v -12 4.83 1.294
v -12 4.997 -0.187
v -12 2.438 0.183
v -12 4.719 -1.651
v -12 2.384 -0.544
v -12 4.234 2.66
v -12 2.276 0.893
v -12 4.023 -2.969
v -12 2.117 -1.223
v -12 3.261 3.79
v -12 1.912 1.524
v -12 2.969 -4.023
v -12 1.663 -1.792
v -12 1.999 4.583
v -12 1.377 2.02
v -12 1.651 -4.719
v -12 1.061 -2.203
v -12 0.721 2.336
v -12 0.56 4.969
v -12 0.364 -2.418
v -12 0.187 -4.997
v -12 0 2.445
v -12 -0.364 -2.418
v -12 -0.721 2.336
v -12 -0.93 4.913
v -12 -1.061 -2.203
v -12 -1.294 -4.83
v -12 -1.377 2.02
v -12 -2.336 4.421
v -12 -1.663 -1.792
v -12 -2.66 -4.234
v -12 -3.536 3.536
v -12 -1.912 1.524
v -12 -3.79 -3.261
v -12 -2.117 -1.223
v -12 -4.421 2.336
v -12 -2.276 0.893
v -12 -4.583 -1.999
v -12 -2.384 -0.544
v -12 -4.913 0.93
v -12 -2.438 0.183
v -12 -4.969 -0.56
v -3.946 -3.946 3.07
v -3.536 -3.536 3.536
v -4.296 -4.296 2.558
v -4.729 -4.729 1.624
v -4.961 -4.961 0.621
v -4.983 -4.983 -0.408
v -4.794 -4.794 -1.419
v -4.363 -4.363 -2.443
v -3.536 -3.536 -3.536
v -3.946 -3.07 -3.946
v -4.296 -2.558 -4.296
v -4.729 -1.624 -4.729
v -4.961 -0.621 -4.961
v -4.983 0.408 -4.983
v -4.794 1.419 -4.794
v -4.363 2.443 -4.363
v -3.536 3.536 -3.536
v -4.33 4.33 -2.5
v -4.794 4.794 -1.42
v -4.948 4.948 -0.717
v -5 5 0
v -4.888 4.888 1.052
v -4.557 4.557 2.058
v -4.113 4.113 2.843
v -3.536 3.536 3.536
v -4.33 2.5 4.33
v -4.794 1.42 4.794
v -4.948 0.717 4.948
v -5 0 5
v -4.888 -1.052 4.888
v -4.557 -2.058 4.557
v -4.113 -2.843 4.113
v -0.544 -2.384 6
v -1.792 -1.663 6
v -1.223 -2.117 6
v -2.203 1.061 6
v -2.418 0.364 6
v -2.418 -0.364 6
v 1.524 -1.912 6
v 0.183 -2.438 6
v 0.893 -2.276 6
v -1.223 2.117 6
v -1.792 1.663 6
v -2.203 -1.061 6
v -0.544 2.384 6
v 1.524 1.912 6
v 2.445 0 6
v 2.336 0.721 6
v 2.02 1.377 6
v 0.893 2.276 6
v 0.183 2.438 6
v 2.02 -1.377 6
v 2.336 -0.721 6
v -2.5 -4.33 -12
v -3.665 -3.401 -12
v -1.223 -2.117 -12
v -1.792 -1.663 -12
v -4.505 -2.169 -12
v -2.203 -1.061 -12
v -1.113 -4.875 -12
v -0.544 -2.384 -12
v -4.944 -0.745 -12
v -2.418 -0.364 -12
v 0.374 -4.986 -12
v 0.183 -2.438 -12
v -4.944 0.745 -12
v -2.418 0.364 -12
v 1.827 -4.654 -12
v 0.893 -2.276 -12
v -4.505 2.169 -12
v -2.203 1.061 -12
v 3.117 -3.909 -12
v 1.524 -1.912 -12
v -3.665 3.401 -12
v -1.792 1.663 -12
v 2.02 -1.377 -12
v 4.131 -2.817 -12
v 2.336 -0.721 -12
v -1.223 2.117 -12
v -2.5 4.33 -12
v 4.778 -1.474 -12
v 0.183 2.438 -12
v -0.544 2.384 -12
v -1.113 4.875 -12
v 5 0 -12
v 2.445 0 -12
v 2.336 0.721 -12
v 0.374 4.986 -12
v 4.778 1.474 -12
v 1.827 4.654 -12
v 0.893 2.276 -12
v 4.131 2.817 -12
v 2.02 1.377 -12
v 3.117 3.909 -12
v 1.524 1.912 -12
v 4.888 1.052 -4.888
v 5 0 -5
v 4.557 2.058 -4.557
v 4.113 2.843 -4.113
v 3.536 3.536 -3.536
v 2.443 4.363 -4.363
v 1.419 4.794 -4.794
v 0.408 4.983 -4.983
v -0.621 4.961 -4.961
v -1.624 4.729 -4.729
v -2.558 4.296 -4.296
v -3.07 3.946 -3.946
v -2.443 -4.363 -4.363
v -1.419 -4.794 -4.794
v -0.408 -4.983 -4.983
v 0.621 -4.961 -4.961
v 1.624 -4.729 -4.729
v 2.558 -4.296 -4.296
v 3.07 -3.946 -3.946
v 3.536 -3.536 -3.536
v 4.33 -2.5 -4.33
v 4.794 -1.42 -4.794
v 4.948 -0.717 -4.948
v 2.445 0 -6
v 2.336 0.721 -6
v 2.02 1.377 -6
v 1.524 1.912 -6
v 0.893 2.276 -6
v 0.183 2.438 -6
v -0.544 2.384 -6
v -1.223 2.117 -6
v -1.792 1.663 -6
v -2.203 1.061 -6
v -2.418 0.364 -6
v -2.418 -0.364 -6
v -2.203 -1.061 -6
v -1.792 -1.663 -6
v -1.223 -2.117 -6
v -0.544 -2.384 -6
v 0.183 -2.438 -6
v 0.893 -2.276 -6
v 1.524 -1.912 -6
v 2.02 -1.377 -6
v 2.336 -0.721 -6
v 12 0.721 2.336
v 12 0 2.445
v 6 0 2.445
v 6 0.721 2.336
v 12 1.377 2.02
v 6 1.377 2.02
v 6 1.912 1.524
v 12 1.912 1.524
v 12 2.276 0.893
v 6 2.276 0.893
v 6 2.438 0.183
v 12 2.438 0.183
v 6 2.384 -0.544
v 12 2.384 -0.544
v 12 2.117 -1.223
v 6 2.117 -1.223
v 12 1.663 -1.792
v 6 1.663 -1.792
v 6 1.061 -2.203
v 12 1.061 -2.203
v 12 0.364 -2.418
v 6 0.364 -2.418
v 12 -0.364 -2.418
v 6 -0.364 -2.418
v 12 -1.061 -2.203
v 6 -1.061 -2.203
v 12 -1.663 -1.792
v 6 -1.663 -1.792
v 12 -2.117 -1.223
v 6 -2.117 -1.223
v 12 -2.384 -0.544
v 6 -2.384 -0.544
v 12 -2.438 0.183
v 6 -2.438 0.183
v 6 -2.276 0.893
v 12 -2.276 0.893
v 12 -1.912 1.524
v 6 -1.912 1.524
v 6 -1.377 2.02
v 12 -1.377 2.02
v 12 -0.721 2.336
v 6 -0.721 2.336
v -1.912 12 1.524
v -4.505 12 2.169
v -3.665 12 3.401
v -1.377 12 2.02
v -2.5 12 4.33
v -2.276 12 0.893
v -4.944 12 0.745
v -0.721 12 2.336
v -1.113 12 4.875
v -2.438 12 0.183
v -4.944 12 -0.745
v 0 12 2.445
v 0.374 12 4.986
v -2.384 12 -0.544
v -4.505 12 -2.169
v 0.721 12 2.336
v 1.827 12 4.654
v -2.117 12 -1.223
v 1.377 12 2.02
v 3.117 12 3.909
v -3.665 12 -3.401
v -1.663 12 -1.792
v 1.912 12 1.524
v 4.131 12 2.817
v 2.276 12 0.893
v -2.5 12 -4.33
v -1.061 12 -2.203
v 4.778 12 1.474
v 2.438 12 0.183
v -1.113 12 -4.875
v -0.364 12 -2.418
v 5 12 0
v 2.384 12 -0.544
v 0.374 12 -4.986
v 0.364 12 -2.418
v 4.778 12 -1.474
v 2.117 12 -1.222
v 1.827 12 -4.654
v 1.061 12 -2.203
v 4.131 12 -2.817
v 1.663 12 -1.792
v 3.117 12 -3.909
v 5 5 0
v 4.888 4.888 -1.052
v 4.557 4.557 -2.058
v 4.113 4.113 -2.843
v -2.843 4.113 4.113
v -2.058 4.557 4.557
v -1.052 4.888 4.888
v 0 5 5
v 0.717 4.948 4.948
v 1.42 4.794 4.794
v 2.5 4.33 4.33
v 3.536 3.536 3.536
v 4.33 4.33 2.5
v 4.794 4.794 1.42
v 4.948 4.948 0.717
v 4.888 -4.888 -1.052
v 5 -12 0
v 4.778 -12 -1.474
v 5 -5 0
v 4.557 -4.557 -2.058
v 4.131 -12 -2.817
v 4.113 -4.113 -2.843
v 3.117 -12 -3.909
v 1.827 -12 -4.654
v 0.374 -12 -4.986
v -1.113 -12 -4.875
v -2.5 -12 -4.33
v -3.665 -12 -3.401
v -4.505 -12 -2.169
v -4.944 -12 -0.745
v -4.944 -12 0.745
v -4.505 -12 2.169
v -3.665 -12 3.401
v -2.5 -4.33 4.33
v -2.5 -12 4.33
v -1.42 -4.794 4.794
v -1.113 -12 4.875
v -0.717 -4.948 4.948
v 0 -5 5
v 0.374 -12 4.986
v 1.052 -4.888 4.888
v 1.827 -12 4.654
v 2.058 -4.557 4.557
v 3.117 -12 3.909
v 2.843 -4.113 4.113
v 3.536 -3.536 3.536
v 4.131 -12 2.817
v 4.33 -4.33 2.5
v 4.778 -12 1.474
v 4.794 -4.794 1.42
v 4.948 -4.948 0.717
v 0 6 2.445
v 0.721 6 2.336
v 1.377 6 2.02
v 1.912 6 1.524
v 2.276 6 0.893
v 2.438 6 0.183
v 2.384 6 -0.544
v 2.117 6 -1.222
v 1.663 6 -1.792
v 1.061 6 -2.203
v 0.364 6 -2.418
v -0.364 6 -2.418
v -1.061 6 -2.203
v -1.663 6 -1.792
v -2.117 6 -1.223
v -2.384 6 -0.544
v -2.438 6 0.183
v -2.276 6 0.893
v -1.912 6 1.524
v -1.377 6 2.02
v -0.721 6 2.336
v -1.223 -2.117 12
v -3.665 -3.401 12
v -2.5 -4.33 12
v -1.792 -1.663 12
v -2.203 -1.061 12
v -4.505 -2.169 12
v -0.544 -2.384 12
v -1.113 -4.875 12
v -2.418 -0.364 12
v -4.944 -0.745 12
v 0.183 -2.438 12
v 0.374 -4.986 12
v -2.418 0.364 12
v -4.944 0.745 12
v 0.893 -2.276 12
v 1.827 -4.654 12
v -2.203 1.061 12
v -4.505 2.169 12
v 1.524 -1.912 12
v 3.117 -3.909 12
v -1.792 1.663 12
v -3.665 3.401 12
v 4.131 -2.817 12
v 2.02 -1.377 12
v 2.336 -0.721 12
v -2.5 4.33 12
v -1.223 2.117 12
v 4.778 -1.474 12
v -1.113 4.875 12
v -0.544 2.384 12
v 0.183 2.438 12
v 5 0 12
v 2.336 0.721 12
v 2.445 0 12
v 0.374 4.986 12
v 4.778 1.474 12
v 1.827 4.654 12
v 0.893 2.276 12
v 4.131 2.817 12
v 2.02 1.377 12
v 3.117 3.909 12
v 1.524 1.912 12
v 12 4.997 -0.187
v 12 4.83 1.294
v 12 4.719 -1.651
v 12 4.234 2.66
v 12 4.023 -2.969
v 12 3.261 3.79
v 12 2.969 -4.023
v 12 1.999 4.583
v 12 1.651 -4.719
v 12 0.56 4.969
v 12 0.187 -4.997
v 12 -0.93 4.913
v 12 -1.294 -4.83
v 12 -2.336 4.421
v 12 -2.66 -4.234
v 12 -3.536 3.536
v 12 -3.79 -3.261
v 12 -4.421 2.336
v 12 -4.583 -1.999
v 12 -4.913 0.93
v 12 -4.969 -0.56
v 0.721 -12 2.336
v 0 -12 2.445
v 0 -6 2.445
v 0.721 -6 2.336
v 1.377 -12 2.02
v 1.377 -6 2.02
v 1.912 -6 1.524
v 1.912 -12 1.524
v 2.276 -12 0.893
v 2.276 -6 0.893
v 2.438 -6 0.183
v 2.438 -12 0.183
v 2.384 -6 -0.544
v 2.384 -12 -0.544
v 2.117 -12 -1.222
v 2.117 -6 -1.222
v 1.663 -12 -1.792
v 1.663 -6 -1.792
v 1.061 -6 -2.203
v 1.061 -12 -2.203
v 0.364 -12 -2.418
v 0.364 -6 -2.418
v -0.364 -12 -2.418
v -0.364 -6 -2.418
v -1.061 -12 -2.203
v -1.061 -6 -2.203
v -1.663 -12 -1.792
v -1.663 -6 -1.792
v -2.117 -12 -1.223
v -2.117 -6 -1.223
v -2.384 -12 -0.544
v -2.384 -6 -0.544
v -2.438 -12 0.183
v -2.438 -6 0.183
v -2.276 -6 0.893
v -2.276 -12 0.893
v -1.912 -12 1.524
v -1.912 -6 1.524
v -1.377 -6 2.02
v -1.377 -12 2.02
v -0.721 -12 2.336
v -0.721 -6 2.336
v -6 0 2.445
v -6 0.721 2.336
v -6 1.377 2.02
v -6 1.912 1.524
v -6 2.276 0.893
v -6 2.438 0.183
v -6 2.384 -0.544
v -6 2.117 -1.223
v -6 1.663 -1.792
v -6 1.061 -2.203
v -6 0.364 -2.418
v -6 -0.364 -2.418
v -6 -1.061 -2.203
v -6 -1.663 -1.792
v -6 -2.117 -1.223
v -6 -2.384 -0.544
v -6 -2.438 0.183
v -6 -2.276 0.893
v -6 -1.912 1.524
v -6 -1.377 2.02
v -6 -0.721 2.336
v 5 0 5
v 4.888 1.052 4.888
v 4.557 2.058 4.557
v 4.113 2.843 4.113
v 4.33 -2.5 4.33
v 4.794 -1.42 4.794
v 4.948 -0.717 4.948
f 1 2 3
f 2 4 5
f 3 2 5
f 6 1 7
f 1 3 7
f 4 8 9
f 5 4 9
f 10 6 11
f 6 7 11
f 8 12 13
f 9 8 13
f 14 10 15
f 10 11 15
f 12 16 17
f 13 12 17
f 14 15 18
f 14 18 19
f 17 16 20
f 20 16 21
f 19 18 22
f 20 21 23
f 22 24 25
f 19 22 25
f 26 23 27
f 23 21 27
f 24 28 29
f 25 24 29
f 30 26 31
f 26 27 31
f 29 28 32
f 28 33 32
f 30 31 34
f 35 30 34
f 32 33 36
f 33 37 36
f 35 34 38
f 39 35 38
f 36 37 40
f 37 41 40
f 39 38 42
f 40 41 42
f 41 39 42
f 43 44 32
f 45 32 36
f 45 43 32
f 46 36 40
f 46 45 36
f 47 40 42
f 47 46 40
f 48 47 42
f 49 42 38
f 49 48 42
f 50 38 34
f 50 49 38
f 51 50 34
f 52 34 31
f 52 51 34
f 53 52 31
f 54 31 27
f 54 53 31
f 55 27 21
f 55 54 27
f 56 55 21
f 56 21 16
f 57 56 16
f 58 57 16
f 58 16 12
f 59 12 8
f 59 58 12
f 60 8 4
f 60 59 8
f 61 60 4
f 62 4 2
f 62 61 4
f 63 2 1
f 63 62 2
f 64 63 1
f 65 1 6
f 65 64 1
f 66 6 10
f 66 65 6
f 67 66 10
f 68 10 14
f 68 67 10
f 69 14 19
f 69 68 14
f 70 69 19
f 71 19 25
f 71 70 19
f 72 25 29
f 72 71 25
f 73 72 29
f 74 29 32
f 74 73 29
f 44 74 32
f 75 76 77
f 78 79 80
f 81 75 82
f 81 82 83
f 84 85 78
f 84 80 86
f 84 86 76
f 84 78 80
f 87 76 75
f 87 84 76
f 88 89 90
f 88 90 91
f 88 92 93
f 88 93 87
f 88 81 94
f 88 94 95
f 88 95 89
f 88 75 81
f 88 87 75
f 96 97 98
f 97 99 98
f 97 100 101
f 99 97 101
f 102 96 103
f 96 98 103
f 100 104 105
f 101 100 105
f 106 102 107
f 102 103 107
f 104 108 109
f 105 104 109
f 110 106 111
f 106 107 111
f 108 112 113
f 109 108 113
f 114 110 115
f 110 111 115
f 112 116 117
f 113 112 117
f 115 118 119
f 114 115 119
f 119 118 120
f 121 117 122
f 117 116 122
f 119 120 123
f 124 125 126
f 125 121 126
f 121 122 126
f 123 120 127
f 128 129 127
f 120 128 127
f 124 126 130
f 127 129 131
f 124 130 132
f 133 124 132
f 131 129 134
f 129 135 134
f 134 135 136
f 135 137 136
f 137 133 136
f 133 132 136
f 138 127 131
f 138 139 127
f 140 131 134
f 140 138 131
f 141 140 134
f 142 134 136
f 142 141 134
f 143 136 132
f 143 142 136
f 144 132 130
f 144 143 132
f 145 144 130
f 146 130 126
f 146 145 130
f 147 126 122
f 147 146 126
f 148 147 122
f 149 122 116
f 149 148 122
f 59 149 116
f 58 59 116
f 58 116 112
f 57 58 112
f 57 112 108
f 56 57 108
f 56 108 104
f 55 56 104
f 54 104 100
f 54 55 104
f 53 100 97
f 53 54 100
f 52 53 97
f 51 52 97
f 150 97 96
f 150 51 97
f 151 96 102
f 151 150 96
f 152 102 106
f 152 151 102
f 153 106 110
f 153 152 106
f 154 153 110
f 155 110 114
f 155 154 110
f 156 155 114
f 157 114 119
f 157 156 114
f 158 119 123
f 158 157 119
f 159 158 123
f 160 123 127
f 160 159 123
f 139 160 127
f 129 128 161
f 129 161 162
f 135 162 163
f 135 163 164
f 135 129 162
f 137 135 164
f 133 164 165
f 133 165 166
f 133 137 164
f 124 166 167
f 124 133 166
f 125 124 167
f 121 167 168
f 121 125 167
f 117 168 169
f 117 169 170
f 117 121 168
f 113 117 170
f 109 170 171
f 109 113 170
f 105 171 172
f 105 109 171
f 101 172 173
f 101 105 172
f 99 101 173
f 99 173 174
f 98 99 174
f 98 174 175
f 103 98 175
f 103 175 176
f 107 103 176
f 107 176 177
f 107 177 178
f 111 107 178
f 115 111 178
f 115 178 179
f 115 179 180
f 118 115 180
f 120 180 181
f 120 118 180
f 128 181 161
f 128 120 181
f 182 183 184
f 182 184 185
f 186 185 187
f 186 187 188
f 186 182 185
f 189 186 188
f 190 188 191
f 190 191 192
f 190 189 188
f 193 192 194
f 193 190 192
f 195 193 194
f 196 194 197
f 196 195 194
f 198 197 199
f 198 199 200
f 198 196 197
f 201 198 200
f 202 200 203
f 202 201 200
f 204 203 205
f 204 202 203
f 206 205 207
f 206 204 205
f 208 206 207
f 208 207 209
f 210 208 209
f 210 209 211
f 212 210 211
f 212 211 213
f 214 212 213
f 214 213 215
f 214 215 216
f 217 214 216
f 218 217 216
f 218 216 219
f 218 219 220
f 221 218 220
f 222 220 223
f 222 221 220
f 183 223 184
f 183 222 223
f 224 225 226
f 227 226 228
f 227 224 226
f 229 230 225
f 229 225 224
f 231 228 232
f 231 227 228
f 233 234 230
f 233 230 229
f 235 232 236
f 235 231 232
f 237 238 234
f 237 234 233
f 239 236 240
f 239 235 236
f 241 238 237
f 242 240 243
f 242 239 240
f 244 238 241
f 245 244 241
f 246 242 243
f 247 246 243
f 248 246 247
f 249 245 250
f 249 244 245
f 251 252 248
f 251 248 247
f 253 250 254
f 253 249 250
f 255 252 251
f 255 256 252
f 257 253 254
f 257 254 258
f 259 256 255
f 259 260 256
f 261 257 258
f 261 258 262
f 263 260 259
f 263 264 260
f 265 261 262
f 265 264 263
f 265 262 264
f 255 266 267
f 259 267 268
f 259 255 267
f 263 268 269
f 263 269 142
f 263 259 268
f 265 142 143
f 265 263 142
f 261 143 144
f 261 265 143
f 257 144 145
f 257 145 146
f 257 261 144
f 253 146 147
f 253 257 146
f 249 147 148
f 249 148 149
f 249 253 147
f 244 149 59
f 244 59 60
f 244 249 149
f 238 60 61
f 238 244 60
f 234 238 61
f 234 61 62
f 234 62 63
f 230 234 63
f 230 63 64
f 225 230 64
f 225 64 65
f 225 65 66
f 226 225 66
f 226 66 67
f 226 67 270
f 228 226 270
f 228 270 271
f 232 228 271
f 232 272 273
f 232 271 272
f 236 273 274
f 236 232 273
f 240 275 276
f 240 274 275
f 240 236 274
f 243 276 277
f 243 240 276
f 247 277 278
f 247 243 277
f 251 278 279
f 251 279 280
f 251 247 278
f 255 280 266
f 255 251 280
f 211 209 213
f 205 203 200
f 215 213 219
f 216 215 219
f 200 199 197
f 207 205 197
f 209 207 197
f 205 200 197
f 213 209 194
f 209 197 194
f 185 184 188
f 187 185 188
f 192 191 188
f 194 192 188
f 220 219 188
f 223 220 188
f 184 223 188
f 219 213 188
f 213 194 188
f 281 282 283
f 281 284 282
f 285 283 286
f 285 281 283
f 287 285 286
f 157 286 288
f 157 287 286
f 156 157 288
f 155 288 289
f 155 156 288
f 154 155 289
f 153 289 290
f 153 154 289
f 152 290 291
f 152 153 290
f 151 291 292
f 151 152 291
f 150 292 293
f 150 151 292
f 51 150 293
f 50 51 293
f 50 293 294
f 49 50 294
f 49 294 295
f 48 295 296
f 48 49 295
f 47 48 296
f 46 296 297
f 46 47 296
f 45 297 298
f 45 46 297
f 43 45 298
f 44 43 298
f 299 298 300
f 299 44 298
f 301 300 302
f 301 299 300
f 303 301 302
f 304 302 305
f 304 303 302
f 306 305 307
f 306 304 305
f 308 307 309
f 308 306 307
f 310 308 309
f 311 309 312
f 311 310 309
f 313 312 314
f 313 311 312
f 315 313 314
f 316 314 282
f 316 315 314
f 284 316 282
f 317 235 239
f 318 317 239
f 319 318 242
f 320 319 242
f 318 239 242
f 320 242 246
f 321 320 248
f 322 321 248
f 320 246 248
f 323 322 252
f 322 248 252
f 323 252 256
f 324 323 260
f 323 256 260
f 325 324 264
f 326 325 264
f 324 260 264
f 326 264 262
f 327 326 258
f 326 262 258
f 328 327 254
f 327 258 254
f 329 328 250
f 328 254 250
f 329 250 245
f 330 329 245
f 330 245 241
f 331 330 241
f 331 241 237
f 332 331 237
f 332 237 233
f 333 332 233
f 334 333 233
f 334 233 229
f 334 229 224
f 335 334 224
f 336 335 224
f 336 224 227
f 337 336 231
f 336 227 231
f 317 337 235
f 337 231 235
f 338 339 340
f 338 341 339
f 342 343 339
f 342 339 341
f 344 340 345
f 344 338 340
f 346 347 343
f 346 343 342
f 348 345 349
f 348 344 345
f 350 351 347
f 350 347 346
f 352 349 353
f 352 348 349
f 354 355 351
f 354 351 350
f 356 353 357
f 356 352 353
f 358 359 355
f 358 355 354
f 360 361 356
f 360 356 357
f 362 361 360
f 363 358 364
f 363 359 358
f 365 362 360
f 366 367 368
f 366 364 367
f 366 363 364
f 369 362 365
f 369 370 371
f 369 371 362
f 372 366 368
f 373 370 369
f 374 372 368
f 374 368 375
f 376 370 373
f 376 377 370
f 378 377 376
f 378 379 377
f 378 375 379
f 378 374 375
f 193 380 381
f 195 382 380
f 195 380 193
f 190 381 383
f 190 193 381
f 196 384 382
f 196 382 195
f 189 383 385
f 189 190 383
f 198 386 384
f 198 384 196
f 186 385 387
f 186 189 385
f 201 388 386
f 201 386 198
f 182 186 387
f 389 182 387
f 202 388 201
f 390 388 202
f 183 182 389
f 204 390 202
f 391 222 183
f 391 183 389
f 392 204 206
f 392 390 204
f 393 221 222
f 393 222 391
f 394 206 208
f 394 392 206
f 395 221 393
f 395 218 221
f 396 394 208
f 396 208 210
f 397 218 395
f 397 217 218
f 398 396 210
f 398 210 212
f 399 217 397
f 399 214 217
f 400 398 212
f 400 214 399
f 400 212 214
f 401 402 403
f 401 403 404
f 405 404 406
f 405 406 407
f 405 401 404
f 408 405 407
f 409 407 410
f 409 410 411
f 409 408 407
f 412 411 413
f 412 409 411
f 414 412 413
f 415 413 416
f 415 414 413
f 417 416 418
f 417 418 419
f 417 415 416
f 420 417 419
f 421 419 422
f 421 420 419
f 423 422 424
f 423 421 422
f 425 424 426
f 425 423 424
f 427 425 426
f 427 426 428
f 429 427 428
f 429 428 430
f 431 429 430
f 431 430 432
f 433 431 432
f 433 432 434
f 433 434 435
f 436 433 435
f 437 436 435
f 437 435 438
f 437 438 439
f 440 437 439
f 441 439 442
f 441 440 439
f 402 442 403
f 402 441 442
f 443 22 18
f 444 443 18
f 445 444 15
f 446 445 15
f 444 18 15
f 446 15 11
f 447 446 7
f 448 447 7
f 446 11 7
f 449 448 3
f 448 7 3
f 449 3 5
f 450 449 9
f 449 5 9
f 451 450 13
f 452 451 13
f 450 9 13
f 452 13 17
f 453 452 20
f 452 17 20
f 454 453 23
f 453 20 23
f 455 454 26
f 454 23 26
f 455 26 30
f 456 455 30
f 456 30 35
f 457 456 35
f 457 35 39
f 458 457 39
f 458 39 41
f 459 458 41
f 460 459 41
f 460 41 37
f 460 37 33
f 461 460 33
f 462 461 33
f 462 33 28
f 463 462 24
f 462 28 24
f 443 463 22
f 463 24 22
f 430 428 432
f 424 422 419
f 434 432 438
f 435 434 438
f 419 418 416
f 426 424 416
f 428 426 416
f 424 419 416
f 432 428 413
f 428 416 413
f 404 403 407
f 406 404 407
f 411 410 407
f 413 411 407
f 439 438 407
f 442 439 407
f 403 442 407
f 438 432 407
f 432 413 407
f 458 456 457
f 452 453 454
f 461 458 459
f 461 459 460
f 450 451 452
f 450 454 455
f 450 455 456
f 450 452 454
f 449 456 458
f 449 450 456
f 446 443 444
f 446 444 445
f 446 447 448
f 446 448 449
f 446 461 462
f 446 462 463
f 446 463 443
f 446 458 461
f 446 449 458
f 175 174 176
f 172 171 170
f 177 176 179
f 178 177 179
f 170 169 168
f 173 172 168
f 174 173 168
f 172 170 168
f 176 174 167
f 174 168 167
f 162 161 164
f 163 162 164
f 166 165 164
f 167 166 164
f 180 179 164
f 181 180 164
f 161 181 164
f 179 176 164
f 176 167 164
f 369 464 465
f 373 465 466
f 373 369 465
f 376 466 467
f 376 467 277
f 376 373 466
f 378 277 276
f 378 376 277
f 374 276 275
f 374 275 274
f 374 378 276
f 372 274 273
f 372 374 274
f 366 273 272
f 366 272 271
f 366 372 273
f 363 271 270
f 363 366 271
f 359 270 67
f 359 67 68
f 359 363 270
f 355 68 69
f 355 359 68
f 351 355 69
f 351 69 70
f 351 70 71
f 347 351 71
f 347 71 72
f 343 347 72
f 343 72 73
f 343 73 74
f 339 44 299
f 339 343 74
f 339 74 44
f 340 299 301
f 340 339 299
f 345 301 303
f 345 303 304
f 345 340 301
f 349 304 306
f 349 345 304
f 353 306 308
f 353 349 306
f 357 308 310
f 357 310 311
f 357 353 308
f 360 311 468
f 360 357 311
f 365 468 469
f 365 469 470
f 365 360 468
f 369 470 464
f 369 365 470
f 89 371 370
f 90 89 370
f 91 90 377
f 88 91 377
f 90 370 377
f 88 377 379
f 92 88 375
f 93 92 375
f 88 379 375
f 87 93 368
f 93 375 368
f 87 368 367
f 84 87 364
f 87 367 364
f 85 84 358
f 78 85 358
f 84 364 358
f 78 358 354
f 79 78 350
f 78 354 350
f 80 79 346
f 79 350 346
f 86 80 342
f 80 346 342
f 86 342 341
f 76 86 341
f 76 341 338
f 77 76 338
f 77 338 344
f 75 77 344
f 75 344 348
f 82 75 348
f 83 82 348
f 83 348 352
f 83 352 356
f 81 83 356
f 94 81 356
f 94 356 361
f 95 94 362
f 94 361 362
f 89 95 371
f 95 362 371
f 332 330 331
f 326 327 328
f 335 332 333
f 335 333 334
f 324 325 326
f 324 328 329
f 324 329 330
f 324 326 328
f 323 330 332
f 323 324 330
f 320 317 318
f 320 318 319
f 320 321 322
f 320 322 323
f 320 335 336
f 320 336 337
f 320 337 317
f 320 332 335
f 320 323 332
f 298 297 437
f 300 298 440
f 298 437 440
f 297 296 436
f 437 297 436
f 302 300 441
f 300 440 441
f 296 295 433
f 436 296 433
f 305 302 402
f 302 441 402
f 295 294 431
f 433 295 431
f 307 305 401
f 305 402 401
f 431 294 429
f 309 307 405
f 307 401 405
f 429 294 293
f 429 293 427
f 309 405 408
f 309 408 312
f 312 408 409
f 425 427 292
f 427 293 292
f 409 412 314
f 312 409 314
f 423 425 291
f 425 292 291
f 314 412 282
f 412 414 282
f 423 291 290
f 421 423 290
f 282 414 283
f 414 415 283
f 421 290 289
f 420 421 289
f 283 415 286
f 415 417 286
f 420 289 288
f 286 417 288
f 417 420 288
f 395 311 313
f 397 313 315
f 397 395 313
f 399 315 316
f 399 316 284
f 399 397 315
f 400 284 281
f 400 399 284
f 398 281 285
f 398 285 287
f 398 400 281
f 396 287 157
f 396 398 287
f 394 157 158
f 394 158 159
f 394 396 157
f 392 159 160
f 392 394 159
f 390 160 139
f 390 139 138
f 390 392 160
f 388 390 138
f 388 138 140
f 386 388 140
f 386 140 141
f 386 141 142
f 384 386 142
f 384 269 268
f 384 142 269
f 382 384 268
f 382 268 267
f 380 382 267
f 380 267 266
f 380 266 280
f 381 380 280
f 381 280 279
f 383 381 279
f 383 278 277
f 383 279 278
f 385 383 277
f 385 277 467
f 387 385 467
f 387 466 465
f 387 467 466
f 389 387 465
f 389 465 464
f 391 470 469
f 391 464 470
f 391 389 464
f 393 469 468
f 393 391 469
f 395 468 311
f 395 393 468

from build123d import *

# Parameters (mm, degrees)
IZIM1_R                     = 5
Y_KSEKLIK_EKSTR_ZYON1_DEPTH = 12
IZIM2_R                     = 5
Y_KSEKLIK_EKSTR_ZYON2_DEPTH = 12
IZIM3_R                     = 5
Y_KSEKLIK_EKSTR_ZYON3_DEPTH = 12
IZIM4_R                     = 2.445
KES_EKSTR_ZYON1_DEPTH       = 6
IZIM5_R                     = 2.445
KES_EKSTR_ZYON2_DEPTH       = 6
IZIM6_R                     = 2.445
KES_EKSTR_ZYON3_DEPTH       = 6


with BuildPart() as part:
    # Çizim1 → Yükseklik-Ekstrüzyon1 (new, symmetric)
    with BuildSketch(Plane.XY):
        Circle(IZIM1_R)
    extrude(amount=Y_KSEKLIK_EKSTR_ZYON1_DEPTH, both=True)

    # Çizim2 → Yükseklik-Ekstrüzyon2 (add, symmetric)
    with BuildSketch(Plane(origin=(0, 0, 0), x_dir=(1, 0, 0), z_dir=(0, 1, 0))):
        Circle(IZIM2_R)
    extrude(amount=Y_KSEKLIK_EKSTR_ZYON2_DEPTH, both=True)

    # Çizim3 → Yükseklik-Ekstrüzyon3 (add, symmetric)
    with BuildSketch(Plane(origin=(0, 0, 0), x_dir=(0, 0, -1), z_dir=(1, 0, 0))):
        with Locations(Location((0, 0, 0), (0, 0, 225))):
            Circle(IZIM3_R)
    extrude(amount=Y_KSEKLIK_EKSTR_ZYON3_DEPTH, both=True)

    # Çizim4 → Kes-Ekstrüzyon1 (cut)
    with BuildSketch(Plane.ZY.offset(12)):
        Circle(IZIM4_R)
    kes_ekstr_zyon1 = extrude(amount=-KES_EKSTR_ZYON1_DEPTH, mode=Mode.SUBTRACT)

    # Aynalama1: Kes-Ekstrüzyon1 across plane
    add(kes_ekstr_zyon1.mirror(Plane(origin=(0, 0, 0), x_dir=(0, 0, 1), z_dir=(1, 0, 0))), mode=Mode.SUBTRACT)

    # Çizim5 → Kes-Ekstrüzyon2 (cut)
    with BuildSketch(Plane.XY.offset(12)):
        Circle(IZIM5_R)
    kes_ekstr_zyon2 = extrude(amount=-KES_EKSTR_ZYON2_DEPTH, mode=Mode.SUBTRACT)

    # Aynalama2: Kes-Ekstrüzyon2 across plane
    add(kes_ekstr_zyon2.mirror(Plane.XY), mode=Mode.SUBTRACT)

    # Çizim6 → Kes-Ekstrüzyon3 (cut)
    with BuildSketch(Plane(origin=(0, 12, 0), x_dir=(1, 0, 0), z_dir=(0, 1, 0))):
        with Locations(Location((0, 0, 0), (0, 0, 270))):
            Circle(IZIM6_R)
    kes_ekstr_zyon3 = extrude(amount=-KES_EKSTR_ZYON3_DEPTH, mode=Mode.SUBTRACT)

    # Aynalama3: Kes-Ekstrüzyon3 across plane
    add(kes_ekstr_zyon3.mirror(Plane.ZX), mode=Mode.SUBTRACT)


solid = part.part
